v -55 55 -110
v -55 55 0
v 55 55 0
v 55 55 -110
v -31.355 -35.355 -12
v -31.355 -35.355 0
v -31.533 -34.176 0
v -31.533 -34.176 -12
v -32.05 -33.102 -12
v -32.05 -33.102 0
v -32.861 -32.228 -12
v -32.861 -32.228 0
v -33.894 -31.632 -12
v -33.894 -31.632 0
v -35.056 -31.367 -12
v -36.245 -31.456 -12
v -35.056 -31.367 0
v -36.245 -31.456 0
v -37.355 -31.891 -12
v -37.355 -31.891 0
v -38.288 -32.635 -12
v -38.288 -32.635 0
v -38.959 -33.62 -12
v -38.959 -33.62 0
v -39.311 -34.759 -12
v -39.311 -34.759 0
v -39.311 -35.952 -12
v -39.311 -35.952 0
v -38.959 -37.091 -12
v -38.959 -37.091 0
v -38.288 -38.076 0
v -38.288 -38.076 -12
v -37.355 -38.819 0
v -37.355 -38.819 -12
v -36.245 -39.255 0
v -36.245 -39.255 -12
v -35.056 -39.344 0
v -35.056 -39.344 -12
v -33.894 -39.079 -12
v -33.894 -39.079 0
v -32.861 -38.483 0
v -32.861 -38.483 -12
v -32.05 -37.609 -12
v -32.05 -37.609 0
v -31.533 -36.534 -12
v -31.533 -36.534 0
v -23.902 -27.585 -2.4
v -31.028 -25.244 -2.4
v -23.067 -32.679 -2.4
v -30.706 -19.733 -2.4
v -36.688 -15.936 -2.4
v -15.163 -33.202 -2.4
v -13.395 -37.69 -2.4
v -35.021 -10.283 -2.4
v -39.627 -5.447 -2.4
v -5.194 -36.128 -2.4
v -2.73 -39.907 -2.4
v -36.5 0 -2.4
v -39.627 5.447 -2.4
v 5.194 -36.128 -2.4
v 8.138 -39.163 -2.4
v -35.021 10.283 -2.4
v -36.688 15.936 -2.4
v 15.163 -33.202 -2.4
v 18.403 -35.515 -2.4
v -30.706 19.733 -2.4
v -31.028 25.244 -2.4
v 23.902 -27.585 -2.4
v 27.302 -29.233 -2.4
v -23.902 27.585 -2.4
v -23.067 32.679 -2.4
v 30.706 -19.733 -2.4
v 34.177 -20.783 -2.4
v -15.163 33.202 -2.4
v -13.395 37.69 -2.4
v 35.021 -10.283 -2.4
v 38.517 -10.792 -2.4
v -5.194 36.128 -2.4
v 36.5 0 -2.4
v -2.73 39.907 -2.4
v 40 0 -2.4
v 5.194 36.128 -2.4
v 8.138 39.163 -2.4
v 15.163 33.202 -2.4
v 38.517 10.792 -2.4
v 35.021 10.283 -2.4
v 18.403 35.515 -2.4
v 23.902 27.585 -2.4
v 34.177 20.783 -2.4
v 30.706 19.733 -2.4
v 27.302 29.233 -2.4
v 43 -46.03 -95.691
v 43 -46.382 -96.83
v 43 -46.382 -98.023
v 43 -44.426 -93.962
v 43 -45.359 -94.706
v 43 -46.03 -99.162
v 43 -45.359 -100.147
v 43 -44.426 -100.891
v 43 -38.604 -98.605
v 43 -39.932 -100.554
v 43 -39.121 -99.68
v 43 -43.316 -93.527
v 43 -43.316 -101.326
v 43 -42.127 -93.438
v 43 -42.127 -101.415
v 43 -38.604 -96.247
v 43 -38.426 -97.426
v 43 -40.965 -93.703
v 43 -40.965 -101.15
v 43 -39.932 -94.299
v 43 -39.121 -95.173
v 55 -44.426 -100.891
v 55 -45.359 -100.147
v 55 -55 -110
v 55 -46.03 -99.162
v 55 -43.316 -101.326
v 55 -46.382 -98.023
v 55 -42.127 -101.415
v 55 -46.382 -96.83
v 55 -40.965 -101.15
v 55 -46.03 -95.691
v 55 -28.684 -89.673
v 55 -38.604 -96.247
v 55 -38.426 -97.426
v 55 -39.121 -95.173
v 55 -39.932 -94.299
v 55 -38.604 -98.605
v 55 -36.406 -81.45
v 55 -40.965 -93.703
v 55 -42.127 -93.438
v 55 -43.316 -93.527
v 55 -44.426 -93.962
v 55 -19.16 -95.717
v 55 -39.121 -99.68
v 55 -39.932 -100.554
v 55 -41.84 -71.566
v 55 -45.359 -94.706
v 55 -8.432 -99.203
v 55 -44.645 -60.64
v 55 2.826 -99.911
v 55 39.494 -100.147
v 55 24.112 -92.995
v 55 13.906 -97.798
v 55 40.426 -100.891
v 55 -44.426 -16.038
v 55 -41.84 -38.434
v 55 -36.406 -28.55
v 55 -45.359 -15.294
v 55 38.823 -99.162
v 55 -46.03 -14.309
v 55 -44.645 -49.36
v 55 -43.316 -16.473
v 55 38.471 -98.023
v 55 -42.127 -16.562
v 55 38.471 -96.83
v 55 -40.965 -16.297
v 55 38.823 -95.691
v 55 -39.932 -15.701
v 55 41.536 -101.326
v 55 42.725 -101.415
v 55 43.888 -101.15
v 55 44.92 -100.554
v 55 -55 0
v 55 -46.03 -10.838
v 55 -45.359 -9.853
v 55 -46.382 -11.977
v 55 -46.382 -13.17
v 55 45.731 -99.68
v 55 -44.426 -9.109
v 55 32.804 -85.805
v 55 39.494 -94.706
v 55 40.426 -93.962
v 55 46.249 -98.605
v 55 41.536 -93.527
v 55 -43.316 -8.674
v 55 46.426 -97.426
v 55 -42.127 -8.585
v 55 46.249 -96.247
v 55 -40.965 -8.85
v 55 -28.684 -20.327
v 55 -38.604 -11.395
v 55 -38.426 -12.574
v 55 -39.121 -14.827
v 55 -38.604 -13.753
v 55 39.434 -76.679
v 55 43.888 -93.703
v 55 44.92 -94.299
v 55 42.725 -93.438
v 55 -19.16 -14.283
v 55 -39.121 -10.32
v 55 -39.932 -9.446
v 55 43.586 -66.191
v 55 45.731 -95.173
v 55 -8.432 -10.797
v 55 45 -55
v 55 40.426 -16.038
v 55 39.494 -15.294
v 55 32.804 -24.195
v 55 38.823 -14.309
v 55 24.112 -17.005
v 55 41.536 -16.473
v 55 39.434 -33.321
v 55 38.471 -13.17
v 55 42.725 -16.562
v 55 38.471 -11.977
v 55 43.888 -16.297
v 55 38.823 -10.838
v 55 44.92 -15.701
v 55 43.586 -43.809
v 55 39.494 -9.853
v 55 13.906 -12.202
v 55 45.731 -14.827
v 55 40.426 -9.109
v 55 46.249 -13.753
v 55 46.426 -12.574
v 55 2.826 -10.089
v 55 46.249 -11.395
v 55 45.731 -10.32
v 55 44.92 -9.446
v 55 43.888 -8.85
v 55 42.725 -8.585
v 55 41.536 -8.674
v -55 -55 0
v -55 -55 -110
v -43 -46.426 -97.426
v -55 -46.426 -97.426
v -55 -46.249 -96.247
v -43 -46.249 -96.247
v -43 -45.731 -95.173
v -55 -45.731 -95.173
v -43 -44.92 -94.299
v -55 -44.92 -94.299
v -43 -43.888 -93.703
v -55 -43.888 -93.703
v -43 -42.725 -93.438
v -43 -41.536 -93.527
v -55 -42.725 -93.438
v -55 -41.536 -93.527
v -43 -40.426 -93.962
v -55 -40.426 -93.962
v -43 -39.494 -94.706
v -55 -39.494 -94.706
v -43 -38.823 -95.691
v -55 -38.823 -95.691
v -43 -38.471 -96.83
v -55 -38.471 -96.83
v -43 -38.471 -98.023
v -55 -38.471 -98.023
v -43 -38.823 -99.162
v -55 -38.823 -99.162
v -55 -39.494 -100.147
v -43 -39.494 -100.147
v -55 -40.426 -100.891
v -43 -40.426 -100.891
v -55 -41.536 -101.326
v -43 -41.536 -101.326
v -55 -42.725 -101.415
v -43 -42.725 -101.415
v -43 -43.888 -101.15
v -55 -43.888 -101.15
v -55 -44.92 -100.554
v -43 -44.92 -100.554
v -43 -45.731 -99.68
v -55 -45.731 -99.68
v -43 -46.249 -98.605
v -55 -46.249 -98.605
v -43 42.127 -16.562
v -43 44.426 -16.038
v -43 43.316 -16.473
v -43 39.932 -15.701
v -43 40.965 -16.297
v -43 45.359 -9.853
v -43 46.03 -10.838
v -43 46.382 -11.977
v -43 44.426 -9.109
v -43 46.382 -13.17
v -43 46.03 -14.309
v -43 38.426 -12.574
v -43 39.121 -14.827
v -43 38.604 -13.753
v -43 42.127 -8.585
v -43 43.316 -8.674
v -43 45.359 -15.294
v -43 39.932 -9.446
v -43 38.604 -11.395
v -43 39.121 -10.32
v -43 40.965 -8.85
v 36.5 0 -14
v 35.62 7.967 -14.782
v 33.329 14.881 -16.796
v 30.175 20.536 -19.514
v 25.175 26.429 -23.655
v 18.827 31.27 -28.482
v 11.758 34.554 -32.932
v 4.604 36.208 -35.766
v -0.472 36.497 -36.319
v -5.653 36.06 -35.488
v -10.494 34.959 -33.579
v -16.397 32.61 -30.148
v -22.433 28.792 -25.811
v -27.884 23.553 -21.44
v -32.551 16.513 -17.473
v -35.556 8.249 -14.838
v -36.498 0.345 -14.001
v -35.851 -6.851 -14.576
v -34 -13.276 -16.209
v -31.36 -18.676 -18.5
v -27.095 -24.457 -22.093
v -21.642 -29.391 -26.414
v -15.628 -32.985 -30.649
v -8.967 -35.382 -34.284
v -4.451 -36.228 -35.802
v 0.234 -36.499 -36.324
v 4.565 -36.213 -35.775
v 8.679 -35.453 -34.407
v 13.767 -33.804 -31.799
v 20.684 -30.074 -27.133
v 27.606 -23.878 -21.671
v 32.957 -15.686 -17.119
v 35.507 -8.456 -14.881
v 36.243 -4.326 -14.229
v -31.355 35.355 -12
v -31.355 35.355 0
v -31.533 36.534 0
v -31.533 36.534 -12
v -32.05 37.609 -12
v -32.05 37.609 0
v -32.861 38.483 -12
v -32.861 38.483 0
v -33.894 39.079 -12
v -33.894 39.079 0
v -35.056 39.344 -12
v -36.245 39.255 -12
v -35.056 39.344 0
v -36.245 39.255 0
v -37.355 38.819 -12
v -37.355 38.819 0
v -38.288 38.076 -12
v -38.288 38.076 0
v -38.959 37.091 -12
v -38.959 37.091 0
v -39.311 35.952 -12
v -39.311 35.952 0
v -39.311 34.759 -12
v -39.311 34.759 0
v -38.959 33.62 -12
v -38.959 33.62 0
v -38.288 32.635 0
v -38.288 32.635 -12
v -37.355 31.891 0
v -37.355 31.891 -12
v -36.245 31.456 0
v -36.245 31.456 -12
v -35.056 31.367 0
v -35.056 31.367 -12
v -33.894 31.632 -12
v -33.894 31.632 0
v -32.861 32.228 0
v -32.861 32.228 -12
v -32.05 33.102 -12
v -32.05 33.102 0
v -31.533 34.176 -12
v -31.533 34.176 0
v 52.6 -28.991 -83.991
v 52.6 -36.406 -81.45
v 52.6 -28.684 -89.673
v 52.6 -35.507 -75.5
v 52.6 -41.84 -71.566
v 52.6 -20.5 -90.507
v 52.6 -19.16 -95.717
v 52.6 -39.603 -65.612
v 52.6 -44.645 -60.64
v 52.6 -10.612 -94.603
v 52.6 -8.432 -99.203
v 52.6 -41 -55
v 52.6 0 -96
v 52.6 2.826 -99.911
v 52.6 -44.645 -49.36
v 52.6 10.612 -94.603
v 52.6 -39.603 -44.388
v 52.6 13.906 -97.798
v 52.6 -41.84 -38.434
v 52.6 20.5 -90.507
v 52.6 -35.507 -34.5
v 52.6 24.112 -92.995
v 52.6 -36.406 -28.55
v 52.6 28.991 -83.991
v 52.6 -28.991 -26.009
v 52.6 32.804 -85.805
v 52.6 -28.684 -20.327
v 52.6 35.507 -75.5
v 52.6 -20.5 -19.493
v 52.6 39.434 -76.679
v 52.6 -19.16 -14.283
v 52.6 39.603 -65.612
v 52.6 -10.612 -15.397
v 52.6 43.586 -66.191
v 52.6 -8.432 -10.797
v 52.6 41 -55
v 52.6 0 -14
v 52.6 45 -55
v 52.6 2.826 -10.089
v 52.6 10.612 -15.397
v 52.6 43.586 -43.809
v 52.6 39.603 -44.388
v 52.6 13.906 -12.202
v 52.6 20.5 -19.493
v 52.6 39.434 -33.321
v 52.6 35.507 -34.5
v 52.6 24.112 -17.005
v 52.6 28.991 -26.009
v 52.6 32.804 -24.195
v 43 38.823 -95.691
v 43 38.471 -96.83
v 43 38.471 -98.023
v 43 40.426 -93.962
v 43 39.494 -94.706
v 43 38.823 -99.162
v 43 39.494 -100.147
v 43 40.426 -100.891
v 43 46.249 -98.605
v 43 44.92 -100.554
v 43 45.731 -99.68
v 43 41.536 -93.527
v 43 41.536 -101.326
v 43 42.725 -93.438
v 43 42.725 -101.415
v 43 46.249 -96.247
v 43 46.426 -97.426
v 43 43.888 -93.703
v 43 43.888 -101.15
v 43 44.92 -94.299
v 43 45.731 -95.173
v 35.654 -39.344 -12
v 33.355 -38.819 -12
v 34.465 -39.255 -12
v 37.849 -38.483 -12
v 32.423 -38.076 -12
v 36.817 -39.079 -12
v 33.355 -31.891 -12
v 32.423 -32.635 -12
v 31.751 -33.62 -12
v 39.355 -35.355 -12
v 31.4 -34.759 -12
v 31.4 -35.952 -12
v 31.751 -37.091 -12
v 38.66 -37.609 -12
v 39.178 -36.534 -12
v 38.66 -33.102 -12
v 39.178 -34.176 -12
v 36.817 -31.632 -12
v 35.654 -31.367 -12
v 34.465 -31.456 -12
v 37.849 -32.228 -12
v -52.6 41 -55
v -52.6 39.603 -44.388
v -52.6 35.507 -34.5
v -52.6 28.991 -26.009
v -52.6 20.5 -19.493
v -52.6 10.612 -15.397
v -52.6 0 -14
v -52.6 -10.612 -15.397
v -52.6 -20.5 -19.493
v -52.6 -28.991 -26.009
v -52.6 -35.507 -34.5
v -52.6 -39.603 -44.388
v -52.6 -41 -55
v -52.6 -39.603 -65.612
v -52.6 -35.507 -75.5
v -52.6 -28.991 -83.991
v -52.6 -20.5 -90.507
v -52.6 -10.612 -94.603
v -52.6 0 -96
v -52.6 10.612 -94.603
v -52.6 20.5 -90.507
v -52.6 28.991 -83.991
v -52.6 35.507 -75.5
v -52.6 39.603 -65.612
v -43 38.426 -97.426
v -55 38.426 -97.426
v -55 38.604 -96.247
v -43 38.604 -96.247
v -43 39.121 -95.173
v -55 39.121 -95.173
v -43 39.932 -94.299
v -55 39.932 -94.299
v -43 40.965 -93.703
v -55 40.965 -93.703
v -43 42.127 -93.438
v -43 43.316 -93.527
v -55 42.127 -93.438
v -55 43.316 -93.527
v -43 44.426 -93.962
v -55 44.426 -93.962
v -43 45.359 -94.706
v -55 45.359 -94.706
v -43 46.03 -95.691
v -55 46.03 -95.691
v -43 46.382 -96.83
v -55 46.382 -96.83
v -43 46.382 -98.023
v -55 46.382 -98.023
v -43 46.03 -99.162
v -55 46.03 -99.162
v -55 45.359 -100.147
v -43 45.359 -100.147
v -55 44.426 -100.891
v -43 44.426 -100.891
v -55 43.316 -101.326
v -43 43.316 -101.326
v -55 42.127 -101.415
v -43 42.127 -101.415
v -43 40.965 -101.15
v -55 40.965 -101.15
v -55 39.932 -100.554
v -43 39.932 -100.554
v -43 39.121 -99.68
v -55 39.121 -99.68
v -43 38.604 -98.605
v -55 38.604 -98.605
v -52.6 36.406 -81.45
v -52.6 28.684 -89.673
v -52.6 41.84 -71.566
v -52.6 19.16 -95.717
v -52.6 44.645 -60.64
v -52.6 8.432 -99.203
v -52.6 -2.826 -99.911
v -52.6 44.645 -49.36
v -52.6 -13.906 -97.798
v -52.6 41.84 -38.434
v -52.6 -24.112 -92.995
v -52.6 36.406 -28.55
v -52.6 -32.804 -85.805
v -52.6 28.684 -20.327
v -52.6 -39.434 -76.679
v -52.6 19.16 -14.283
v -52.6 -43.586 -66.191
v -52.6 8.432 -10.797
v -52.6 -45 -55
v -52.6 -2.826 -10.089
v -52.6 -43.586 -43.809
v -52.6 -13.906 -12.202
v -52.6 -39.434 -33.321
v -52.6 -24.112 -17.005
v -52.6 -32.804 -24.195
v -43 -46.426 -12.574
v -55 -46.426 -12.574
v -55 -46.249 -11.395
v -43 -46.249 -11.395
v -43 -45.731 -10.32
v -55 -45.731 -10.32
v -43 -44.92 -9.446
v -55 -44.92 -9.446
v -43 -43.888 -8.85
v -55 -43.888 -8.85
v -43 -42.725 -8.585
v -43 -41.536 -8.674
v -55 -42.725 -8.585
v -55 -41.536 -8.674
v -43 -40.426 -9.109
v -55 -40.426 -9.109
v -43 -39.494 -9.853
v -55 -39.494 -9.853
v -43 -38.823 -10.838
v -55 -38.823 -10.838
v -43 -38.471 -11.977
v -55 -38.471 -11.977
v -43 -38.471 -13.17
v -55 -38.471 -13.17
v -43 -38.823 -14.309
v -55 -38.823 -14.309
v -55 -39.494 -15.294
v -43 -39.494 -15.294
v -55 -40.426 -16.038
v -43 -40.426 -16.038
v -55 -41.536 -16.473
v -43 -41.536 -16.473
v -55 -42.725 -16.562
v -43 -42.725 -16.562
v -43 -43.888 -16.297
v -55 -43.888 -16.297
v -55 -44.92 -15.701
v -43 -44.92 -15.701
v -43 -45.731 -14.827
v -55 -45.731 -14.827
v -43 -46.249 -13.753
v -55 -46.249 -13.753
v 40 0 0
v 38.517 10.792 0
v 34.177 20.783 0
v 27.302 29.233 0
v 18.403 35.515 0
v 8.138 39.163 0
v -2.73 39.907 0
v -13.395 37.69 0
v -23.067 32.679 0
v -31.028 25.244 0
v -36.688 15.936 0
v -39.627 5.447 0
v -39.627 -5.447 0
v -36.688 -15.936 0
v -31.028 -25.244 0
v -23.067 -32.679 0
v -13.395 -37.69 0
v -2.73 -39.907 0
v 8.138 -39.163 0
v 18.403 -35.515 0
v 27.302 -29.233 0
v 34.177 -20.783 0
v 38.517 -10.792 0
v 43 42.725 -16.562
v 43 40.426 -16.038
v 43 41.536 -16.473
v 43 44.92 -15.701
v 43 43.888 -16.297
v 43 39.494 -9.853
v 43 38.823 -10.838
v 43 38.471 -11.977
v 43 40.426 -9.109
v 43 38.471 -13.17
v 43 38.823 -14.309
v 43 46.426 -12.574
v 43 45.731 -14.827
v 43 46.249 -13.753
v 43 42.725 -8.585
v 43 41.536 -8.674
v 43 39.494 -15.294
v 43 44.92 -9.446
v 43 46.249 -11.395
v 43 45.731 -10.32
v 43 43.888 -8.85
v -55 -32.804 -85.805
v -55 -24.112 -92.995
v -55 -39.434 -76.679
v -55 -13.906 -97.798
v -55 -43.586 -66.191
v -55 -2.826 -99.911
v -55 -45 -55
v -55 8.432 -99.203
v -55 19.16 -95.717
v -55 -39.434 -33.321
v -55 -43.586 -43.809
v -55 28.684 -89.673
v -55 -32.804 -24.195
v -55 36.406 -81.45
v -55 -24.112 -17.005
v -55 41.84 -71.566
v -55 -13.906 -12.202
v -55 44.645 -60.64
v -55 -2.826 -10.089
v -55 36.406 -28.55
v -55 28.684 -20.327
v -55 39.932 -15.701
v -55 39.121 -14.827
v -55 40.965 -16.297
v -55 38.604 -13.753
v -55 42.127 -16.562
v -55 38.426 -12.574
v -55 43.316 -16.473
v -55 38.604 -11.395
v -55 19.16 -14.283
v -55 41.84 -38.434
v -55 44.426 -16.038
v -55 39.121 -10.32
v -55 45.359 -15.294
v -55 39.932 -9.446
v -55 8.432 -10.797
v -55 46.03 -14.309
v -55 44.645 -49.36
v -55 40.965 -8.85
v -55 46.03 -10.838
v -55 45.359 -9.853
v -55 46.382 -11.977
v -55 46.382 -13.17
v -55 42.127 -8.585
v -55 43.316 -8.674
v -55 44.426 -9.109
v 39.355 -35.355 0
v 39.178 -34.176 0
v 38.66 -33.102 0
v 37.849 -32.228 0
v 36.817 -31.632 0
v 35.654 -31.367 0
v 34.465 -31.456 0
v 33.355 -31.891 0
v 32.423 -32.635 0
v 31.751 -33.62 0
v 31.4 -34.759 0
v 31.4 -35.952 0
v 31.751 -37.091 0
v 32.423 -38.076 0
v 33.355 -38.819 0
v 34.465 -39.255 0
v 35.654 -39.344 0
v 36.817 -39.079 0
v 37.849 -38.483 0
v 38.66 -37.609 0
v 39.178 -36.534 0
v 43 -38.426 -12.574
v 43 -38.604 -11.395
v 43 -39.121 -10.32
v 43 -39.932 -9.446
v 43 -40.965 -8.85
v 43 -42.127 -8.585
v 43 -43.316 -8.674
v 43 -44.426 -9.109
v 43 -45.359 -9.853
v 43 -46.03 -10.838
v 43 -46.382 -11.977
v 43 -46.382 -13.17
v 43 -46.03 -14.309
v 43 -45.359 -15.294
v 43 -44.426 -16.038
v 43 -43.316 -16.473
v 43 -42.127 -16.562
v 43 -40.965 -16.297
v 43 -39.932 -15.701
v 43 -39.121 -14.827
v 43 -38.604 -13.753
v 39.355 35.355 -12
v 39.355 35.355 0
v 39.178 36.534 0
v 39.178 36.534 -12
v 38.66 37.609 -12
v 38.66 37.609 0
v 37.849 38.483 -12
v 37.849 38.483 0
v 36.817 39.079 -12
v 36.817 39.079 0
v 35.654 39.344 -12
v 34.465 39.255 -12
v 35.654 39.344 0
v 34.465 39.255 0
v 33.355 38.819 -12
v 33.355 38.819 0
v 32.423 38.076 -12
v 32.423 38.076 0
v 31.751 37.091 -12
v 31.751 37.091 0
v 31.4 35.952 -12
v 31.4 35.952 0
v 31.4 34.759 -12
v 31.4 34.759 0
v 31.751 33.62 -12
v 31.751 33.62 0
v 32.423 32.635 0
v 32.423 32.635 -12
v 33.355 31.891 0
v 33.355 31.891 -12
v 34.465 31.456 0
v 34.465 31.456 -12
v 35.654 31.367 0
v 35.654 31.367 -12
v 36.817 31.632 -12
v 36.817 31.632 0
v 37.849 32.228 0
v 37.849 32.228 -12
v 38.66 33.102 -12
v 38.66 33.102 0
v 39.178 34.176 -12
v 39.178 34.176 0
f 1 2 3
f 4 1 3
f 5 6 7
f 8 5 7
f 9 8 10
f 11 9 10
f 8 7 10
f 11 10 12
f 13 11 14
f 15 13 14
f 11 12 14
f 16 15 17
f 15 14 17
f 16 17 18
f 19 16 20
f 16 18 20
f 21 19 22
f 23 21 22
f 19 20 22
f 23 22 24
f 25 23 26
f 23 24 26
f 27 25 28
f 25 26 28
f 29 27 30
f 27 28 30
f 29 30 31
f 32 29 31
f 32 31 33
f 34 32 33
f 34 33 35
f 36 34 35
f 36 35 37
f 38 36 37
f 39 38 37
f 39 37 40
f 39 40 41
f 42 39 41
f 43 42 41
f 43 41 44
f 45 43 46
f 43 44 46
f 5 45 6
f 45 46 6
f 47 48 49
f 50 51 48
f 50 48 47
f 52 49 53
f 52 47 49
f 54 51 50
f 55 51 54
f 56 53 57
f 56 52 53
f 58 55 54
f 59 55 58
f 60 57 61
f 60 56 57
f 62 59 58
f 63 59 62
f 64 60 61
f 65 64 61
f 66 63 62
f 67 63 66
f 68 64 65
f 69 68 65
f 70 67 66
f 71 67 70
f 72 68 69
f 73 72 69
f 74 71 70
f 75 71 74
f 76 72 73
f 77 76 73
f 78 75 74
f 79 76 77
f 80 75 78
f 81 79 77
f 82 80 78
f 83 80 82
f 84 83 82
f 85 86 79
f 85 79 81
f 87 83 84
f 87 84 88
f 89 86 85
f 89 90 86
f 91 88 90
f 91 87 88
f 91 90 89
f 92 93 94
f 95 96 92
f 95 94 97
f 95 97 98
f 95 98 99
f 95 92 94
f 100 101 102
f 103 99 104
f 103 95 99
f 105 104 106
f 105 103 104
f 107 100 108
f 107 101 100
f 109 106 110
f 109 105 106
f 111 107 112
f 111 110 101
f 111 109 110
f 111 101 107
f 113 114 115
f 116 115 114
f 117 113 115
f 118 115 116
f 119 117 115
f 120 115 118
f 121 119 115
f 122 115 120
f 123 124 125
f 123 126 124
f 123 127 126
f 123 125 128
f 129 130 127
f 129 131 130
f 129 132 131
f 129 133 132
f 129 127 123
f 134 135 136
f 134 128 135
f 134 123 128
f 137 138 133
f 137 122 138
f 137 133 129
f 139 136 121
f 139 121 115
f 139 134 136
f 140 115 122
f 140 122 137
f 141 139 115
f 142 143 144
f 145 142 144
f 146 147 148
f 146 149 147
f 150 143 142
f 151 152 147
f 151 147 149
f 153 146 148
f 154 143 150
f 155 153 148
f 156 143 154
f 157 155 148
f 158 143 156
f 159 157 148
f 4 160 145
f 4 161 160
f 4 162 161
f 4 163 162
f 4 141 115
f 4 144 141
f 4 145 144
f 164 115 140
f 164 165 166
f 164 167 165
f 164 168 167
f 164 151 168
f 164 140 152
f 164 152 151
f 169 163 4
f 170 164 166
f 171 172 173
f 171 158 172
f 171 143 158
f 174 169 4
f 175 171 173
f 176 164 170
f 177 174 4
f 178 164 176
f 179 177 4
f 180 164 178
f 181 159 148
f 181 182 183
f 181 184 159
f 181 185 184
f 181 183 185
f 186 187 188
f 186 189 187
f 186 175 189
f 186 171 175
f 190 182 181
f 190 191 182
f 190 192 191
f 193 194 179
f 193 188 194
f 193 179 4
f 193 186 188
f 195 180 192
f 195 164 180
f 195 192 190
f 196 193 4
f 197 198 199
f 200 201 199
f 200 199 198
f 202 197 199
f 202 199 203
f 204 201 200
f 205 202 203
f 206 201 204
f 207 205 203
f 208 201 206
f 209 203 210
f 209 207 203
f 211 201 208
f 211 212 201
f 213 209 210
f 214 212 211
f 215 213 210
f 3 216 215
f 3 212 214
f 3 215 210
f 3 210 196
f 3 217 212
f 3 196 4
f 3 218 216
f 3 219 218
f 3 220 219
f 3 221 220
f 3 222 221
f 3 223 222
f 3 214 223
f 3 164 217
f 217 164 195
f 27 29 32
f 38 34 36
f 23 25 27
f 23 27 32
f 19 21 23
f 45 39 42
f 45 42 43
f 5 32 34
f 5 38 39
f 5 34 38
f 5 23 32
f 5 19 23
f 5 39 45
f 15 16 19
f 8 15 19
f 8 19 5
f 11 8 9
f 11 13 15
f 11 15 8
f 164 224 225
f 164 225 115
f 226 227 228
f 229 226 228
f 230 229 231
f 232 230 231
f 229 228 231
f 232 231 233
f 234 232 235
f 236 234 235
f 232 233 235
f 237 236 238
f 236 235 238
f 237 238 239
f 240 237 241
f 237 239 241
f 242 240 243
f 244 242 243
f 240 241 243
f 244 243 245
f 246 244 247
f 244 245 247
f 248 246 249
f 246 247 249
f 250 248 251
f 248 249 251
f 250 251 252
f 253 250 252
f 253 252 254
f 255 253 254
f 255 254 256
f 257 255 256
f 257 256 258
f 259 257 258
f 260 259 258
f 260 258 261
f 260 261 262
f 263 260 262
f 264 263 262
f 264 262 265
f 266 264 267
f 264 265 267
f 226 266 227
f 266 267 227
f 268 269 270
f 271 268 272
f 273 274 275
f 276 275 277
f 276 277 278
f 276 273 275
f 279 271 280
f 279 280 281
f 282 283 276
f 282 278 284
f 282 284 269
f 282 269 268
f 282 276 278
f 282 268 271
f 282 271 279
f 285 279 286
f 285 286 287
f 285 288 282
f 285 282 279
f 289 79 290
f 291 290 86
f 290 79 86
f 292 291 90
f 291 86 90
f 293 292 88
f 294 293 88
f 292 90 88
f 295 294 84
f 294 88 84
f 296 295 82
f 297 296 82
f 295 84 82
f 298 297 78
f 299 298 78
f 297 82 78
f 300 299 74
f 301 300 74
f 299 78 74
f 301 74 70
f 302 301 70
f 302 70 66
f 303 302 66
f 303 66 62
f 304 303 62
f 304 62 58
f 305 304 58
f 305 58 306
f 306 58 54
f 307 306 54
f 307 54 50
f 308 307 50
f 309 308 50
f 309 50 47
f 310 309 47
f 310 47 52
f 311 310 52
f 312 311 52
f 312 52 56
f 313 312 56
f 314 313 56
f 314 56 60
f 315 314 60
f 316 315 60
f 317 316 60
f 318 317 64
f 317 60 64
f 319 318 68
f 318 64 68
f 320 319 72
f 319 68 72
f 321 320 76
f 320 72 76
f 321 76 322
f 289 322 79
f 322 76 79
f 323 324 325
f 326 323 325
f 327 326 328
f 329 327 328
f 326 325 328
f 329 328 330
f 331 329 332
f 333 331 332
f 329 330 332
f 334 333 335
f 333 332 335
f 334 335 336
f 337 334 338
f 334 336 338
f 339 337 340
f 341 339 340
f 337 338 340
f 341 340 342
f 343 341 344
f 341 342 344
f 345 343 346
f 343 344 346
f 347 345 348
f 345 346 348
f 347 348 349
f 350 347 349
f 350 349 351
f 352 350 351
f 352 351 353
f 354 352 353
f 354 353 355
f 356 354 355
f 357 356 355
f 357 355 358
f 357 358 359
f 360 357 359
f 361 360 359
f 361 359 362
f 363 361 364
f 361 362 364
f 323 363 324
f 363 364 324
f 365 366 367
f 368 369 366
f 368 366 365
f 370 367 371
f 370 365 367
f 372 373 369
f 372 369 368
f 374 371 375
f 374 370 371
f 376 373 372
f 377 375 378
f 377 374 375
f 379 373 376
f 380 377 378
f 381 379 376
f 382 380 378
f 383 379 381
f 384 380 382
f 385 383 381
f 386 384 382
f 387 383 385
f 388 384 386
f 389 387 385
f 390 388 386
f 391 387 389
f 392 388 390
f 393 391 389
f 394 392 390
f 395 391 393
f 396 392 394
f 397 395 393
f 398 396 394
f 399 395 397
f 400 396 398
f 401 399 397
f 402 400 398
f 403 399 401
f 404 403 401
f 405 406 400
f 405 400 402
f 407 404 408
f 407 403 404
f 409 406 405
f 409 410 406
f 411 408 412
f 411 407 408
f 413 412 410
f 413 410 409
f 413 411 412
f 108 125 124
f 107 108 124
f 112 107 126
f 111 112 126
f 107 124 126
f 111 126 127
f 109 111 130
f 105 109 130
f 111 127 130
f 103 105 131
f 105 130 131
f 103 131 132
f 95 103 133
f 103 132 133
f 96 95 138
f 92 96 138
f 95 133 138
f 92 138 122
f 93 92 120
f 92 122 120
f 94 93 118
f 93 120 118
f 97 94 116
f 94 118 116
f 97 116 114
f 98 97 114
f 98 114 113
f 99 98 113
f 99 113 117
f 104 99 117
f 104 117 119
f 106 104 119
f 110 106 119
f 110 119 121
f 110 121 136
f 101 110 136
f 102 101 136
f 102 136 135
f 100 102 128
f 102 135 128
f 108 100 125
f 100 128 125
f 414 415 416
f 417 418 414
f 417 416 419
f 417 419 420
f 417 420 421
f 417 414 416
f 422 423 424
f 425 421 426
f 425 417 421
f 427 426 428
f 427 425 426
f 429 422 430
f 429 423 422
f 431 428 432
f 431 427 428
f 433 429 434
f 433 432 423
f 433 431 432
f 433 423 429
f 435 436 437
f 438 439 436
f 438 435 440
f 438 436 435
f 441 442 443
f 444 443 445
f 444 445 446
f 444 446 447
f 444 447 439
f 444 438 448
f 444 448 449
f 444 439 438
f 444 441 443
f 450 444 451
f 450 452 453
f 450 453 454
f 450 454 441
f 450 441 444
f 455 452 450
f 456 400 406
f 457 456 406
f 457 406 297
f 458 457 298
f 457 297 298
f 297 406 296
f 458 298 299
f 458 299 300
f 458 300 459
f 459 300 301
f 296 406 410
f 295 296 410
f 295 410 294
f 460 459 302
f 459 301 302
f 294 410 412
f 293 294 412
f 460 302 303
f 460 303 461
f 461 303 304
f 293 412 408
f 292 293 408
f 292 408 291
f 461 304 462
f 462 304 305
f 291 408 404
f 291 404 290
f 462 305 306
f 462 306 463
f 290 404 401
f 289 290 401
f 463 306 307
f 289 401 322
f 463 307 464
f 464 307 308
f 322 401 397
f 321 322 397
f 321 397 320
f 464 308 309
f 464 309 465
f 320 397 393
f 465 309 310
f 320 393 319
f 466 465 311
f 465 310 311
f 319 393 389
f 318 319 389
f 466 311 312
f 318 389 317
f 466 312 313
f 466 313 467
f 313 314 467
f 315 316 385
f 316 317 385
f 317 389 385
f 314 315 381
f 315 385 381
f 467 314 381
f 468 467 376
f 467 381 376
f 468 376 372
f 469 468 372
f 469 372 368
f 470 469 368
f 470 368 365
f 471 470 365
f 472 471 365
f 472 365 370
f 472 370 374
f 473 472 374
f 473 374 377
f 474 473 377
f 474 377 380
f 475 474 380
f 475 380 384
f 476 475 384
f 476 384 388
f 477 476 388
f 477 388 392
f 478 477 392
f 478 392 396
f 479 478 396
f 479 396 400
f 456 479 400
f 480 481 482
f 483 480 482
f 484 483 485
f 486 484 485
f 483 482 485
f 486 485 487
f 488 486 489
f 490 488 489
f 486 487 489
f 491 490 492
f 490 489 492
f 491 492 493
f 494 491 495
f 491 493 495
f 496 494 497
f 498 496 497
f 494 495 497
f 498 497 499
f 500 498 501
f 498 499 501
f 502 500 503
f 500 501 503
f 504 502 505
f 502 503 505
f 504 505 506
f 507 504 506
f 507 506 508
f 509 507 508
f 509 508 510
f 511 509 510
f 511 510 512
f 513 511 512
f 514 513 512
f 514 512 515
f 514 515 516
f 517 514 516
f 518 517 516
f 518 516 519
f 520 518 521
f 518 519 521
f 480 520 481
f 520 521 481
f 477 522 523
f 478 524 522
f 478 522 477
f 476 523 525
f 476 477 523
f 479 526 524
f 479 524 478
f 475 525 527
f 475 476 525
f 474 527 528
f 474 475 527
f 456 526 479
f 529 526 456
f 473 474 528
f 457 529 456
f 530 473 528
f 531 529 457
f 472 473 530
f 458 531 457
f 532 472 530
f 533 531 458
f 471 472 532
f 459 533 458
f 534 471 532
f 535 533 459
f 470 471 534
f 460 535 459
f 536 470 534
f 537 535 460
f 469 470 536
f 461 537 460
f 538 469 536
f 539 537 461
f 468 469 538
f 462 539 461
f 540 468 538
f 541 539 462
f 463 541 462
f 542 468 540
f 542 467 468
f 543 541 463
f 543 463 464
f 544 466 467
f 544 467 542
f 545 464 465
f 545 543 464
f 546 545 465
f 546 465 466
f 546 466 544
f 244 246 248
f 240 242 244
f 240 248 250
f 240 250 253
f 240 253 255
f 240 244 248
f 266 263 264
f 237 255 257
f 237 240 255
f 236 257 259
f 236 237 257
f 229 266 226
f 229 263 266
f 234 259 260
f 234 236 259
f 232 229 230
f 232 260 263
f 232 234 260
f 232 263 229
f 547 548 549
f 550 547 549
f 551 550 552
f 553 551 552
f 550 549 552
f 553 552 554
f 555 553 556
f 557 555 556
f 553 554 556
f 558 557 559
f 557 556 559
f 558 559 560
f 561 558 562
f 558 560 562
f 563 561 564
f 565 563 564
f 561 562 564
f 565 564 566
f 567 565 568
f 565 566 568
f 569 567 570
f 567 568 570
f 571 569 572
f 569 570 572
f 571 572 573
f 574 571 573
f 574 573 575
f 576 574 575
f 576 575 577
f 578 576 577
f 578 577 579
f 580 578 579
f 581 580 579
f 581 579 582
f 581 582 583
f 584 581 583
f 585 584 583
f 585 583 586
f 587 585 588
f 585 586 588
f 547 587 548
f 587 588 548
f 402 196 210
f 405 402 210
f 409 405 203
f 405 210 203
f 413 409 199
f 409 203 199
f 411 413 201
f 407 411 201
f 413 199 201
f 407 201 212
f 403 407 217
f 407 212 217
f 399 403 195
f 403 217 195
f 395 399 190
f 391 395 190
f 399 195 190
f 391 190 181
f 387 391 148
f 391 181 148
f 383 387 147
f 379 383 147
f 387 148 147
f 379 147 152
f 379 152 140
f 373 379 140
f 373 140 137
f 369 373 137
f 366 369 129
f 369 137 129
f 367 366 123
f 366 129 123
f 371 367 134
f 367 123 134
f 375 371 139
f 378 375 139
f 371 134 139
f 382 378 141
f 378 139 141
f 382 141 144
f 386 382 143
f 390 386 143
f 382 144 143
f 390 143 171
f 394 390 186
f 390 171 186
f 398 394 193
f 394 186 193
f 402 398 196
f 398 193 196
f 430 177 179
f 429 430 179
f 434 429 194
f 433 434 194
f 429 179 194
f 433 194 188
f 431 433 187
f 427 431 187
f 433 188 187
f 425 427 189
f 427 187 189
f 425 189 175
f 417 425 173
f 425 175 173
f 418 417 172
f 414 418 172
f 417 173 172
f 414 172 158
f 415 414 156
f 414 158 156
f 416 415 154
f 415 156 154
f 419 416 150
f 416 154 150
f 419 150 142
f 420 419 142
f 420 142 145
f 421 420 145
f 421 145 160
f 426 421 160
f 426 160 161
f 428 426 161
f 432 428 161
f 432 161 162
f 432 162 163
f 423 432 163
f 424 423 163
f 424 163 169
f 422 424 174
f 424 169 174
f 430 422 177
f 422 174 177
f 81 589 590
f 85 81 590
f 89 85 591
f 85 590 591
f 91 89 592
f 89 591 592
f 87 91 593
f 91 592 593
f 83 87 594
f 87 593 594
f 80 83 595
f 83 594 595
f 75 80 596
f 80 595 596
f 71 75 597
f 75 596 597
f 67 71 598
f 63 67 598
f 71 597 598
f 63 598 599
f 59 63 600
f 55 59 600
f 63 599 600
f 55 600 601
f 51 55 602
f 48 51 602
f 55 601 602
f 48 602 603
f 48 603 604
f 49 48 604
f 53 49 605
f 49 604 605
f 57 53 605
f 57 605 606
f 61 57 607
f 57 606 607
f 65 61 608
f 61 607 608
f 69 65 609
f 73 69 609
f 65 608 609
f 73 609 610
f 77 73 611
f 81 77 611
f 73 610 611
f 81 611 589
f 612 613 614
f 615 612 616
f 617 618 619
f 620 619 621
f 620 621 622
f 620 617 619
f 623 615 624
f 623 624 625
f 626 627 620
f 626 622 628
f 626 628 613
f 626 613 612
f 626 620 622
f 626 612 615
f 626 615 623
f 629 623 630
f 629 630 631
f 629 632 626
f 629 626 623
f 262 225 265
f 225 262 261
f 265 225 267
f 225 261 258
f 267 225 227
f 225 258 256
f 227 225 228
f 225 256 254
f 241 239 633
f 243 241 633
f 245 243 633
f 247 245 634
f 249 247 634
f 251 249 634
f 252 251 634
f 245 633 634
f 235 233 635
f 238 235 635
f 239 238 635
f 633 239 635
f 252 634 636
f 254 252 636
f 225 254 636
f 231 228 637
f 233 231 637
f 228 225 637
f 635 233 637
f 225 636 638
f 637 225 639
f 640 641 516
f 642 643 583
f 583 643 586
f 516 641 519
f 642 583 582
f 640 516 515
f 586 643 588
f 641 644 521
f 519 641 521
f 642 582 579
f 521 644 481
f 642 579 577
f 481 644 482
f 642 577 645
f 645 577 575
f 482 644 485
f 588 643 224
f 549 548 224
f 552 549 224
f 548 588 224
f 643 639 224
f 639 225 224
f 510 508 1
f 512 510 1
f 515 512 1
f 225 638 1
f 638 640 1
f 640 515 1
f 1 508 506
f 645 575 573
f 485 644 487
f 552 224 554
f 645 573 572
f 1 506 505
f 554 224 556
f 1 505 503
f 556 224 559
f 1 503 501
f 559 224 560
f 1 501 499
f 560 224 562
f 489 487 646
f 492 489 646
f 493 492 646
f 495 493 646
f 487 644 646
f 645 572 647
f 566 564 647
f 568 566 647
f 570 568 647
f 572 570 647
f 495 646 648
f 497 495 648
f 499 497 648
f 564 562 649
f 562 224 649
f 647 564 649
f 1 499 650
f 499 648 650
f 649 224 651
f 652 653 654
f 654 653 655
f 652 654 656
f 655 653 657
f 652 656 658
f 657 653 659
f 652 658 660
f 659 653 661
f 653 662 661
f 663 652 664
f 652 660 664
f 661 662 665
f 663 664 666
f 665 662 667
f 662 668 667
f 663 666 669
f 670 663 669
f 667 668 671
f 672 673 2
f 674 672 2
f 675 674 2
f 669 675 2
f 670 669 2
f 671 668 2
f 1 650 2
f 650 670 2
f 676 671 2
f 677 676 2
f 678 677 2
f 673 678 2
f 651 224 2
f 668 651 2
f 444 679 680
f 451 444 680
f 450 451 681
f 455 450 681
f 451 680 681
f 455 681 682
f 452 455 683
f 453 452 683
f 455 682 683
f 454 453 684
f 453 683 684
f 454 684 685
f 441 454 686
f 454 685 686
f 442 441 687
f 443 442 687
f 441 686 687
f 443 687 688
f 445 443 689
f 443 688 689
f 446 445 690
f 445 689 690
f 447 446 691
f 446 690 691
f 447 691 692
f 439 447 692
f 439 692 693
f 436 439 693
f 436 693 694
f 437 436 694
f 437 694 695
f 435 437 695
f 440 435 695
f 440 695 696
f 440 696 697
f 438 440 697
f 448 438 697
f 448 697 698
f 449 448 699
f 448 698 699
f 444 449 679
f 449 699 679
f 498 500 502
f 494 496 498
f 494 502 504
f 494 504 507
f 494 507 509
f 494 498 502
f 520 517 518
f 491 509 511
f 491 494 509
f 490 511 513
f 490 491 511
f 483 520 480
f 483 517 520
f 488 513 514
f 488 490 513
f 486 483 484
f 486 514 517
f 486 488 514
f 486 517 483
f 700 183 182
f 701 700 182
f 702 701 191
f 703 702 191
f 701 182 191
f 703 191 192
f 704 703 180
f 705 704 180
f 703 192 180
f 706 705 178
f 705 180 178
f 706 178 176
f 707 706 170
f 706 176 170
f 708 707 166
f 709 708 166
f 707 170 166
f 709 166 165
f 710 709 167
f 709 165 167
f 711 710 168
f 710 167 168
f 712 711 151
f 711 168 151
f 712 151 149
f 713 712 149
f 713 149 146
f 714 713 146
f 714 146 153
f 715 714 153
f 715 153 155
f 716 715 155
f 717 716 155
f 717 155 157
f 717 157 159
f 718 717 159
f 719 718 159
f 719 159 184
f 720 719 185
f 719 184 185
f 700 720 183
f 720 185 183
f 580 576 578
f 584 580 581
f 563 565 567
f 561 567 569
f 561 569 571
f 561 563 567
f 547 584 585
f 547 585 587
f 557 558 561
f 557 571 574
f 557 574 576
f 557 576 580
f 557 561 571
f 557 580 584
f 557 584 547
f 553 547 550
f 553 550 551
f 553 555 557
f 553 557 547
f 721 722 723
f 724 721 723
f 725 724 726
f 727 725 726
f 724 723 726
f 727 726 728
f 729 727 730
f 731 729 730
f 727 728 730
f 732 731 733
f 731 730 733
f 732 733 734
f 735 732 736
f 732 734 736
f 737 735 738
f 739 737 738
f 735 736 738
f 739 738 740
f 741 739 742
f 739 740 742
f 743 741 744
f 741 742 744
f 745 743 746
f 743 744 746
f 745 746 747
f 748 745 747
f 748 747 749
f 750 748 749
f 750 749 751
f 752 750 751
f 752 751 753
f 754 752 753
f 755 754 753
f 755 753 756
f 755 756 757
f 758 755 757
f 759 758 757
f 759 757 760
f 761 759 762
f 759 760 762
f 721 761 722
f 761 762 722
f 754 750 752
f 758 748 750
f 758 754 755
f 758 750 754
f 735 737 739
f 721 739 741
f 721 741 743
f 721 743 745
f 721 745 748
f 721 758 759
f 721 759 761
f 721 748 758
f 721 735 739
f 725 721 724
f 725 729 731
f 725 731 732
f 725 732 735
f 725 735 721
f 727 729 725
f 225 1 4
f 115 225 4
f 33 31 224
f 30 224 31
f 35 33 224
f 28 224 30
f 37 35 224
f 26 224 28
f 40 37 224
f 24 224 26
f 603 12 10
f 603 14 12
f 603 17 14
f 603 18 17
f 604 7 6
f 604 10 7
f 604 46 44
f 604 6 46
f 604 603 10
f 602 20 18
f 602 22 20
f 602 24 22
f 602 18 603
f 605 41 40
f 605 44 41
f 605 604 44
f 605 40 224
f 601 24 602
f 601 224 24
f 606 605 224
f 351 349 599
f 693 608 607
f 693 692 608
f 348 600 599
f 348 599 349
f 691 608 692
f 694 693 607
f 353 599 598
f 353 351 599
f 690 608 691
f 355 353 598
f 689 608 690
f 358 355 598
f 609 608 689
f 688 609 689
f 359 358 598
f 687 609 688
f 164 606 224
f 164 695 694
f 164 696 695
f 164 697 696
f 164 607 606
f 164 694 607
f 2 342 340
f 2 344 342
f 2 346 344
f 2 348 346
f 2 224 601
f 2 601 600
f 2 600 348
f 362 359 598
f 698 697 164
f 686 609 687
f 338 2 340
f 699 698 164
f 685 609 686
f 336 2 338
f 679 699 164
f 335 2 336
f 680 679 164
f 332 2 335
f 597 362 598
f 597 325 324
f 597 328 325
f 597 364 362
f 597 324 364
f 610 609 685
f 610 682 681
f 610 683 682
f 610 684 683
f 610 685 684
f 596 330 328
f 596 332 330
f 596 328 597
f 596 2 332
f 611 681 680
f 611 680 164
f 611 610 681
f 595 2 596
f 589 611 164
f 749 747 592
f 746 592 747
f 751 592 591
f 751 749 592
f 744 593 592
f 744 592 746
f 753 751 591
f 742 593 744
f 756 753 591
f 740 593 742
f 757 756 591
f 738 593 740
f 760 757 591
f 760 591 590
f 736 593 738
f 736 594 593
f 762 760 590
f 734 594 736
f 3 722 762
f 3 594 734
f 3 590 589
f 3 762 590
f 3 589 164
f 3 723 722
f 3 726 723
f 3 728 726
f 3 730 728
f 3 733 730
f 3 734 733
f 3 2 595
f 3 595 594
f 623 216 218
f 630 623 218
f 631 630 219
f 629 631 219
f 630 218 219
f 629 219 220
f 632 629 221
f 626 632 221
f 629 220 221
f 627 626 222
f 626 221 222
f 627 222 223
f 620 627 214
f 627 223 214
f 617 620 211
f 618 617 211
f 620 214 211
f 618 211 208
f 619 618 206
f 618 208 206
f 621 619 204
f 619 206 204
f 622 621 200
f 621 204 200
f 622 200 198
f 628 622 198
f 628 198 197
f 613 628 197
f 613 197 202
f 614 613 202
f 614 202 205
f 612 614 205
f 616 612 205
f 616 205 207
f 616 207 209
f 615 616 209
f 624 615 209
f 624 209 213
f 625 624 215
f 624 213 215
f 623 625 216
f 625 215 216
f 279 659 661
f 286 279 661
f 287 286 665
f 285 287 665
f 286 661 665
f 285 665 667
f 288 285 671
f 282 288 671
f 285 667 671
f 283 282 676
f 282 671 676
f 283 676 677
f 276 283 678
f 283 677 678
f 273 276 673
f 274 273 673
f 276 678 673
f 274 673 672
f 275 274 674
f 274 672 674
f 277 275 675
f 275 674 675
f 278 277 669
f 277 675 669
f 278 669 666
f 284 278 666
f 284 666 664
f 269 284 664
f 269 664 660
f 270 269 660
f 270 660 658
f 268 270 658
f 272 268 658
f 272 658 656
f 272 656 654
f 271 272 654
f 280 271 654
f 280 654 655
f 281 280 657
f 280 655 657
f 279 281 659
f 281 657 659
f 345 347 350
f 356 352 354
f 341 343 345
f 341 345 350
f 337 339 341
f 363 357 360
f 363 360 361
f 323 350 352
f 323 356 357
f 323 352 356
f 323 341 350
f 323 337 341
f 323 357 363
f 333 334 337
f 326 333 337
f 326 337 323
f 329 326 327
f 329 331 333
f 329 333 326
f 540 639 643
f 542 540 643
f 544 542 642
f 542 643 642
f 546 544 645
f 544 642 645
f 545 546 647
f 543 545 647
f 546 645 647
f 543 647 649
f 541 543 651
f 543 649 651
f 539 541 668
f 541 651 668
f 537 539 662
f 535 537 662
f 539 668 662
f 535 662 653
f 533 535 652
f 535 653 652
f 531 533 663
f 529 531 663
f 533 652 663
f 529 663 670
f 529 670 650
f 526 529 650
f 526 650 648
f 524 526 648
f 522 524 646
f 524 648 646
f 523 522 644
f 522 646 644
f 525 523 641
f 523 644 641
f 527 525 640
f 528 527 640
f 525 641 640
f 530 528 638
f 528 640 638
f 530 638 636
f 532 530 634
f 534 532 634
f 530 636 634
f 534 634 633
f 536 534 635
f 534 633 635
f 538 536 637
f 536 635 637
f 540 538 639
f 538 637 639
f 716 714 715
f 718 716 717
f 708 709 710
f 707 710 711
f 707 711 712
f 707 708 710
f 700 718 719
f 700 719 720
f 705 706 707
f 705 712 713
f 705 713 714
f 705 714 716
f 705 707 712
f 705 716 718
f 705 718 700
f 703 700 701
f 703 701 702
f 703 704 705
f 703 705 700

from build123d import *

# Parameters (mm, degrees)
F0_W      = 110
F0_H      = 110
F0_R      = 4
F0_R_2    = 40
F0_R_3    = 36.5
F1_DEPTH  = 110
F2_DEPTH  = 2.4
F3_DEPTH  = 36.5
F4_DEPTH  = 12
F5_R      = 41
F6_DEPTH  = 110.001
F5_R_2    = 45
F7_DEPTH  = 2.4
F5_R_3    = 4
F8_DEPTH  = 12
F9_R      = 45
F9_R_2    = 41
F10_DEPTH = 2.4
F9_R_3    = 4
F11_DEPTH = 12


with BuildPart() as f1:
    # F0 (on Top) → F1 (new body)
    with BuildSketch(Plane.XY):
        Rectangle(F0_W, F0_H)
        with Locations((-35.3553390593, -35.3553390593)):
            Circle(F0_R, mode=Mode.SUBTRACT)
        with Locations((35.3553390593, -35.3553390593)):
            Circle(F0_R, mode=Mode.SUBTRACT)
        with Locations((-35.3553390593, 35.3553390593)):
            Circle(F0_R, mode=Mode.SUBTRACT)
        Circle(F0_R_2, mode=Mode.SUBTRACT)
        with Locations((35.3553390593, 35.3553390593)):
            Circle(F0_R, mode=Mode.SUBTRACT)
        Circle(F0_R_2)
        Circle(F0_R_3, mode=Mode.SUBTRACT)
        Circle(F0_R_3)
        with Locations((35.3553390593, -35.3553390593)):
            Circle(F0_R)
        with Locations((-35.3553390593, -35.3553390593)):
            Circle(F0_R)
        with Locations((-35.3553390593, 35.3553390593)):
            Circle(F0_R)
        with Locations((35.3553390593, 35.3553390593)):
            Circle(F0_R)
    extrude(amount=-F1_DEPTH)

    # F0 (on Top) → F2 (cut)
    with BuildSketch(Plane.XY):
        Circle(F0_R_2)
        Circle(F0_R_3, mode=Mode.SUBTRACT)
    extrude(amount=-F2_DEPTH, mode=Mode.SUBTRACT)

    # F0 (on Top) → F3 (cut)
    with BuildSketch(Plane.XY):
        Circle(F0_R_3)
    extrude(amount=-F3_DEPTH, mode=Mode.SUBTRACT)

    # F0 (on Top) → F4 (cut)
    with BuildSketch(Plane.XY):
        with Locations((35.3553390593, 35.3553390593)):
            Circle(F0_R)
        with Locations((-35.3553390593, 35.3553390593)):
            Circle(F0_R)
        with Locations((-35.3553390593, -35.3553390593)):
            Circle(F0_R)
        with Locations((35.3553390593, -35.3553390593)):
            Circle(F0_R)
    extrude(amount=-F4_DEPTH, mode=Mode.SUBTRACT)

    # F5 (on face) → F6 (cut, through all)
    with BuildSketch(Plane.YZ.offset(55)):
        with Locations((0, -55)):
            Circle(F5_R)
    extrude(amount=-F6_DEPTH, mode=Mode.SUBTRACT)

    # F5 (on face) → F7 (cut)
    with BuildSketch(Plane.YZ.offset(55)):
        with Locations((0, -55)):
            Circle(F5_R_2)
        with Locations((0, -55)):
            Circle(F5_R, mode=Mode.SUBTRACT)
    extrude(amount=-F7_DEPTH, mode=Mode.SUBTRACT)

    # F5 (on face) → F8 (cut)
    with BuildSketch(Plane.YZ.offset(55)):
        with Locations((42.4264068712, -12.5735931288)):
            Circle(F5_R_3)
        with Locations((-42.4264068712, -12.5735931288)):
            Circle(F5_R_3)
        with Locations((-42.4264068712, -97.4264068712)):
            Circle(F5_R_3)
        with Locations((42.4264068712, -97.4264068712)):
            Circle(F5_R_3)
    extrude(amount=-F8_DEPTH, mode=Mode.SUBTRACT)

    # F9 (on face) → F10 (cut)
    with BuildSketch(Plane(origin=(-55, 0, 0), x_dir=(0, -1, 0), z_dir=(-1, 0, 0))):
        with Locations((0, -55)):
            Circle(F9_R)
        with Locations((0, -55)):
            Circle(F9_R_2, mode=Mode.SUBTRACT)
    extrude(amount=-F10_DEPTH, mode=Mode.SUBTRACT)

    # F9 (on face) → F11 (cut)
    with BuildSketch(Plane(origin=(-55, 0, 0), x_dir=(0, -1, 0), z_dir=(-1, 0, 0))):
        with Locations((-42.4264068712, -12.5735931288)):
            Circle(F9_R_3)
        with Locations((42.4264068712, -12.5735931288)):
            Circle(F9_R_3)
        with Locations((42.4264068712, -97.4264068712)):
            Circle(F9_R_3)
        with Locations((-42.4264068712, -97.4264068712)):
            Circle(F9_R_3)
    extrude(amount=-F11_DEPTH, mode=Mode.SUBTRACT)


solid = f1.part
